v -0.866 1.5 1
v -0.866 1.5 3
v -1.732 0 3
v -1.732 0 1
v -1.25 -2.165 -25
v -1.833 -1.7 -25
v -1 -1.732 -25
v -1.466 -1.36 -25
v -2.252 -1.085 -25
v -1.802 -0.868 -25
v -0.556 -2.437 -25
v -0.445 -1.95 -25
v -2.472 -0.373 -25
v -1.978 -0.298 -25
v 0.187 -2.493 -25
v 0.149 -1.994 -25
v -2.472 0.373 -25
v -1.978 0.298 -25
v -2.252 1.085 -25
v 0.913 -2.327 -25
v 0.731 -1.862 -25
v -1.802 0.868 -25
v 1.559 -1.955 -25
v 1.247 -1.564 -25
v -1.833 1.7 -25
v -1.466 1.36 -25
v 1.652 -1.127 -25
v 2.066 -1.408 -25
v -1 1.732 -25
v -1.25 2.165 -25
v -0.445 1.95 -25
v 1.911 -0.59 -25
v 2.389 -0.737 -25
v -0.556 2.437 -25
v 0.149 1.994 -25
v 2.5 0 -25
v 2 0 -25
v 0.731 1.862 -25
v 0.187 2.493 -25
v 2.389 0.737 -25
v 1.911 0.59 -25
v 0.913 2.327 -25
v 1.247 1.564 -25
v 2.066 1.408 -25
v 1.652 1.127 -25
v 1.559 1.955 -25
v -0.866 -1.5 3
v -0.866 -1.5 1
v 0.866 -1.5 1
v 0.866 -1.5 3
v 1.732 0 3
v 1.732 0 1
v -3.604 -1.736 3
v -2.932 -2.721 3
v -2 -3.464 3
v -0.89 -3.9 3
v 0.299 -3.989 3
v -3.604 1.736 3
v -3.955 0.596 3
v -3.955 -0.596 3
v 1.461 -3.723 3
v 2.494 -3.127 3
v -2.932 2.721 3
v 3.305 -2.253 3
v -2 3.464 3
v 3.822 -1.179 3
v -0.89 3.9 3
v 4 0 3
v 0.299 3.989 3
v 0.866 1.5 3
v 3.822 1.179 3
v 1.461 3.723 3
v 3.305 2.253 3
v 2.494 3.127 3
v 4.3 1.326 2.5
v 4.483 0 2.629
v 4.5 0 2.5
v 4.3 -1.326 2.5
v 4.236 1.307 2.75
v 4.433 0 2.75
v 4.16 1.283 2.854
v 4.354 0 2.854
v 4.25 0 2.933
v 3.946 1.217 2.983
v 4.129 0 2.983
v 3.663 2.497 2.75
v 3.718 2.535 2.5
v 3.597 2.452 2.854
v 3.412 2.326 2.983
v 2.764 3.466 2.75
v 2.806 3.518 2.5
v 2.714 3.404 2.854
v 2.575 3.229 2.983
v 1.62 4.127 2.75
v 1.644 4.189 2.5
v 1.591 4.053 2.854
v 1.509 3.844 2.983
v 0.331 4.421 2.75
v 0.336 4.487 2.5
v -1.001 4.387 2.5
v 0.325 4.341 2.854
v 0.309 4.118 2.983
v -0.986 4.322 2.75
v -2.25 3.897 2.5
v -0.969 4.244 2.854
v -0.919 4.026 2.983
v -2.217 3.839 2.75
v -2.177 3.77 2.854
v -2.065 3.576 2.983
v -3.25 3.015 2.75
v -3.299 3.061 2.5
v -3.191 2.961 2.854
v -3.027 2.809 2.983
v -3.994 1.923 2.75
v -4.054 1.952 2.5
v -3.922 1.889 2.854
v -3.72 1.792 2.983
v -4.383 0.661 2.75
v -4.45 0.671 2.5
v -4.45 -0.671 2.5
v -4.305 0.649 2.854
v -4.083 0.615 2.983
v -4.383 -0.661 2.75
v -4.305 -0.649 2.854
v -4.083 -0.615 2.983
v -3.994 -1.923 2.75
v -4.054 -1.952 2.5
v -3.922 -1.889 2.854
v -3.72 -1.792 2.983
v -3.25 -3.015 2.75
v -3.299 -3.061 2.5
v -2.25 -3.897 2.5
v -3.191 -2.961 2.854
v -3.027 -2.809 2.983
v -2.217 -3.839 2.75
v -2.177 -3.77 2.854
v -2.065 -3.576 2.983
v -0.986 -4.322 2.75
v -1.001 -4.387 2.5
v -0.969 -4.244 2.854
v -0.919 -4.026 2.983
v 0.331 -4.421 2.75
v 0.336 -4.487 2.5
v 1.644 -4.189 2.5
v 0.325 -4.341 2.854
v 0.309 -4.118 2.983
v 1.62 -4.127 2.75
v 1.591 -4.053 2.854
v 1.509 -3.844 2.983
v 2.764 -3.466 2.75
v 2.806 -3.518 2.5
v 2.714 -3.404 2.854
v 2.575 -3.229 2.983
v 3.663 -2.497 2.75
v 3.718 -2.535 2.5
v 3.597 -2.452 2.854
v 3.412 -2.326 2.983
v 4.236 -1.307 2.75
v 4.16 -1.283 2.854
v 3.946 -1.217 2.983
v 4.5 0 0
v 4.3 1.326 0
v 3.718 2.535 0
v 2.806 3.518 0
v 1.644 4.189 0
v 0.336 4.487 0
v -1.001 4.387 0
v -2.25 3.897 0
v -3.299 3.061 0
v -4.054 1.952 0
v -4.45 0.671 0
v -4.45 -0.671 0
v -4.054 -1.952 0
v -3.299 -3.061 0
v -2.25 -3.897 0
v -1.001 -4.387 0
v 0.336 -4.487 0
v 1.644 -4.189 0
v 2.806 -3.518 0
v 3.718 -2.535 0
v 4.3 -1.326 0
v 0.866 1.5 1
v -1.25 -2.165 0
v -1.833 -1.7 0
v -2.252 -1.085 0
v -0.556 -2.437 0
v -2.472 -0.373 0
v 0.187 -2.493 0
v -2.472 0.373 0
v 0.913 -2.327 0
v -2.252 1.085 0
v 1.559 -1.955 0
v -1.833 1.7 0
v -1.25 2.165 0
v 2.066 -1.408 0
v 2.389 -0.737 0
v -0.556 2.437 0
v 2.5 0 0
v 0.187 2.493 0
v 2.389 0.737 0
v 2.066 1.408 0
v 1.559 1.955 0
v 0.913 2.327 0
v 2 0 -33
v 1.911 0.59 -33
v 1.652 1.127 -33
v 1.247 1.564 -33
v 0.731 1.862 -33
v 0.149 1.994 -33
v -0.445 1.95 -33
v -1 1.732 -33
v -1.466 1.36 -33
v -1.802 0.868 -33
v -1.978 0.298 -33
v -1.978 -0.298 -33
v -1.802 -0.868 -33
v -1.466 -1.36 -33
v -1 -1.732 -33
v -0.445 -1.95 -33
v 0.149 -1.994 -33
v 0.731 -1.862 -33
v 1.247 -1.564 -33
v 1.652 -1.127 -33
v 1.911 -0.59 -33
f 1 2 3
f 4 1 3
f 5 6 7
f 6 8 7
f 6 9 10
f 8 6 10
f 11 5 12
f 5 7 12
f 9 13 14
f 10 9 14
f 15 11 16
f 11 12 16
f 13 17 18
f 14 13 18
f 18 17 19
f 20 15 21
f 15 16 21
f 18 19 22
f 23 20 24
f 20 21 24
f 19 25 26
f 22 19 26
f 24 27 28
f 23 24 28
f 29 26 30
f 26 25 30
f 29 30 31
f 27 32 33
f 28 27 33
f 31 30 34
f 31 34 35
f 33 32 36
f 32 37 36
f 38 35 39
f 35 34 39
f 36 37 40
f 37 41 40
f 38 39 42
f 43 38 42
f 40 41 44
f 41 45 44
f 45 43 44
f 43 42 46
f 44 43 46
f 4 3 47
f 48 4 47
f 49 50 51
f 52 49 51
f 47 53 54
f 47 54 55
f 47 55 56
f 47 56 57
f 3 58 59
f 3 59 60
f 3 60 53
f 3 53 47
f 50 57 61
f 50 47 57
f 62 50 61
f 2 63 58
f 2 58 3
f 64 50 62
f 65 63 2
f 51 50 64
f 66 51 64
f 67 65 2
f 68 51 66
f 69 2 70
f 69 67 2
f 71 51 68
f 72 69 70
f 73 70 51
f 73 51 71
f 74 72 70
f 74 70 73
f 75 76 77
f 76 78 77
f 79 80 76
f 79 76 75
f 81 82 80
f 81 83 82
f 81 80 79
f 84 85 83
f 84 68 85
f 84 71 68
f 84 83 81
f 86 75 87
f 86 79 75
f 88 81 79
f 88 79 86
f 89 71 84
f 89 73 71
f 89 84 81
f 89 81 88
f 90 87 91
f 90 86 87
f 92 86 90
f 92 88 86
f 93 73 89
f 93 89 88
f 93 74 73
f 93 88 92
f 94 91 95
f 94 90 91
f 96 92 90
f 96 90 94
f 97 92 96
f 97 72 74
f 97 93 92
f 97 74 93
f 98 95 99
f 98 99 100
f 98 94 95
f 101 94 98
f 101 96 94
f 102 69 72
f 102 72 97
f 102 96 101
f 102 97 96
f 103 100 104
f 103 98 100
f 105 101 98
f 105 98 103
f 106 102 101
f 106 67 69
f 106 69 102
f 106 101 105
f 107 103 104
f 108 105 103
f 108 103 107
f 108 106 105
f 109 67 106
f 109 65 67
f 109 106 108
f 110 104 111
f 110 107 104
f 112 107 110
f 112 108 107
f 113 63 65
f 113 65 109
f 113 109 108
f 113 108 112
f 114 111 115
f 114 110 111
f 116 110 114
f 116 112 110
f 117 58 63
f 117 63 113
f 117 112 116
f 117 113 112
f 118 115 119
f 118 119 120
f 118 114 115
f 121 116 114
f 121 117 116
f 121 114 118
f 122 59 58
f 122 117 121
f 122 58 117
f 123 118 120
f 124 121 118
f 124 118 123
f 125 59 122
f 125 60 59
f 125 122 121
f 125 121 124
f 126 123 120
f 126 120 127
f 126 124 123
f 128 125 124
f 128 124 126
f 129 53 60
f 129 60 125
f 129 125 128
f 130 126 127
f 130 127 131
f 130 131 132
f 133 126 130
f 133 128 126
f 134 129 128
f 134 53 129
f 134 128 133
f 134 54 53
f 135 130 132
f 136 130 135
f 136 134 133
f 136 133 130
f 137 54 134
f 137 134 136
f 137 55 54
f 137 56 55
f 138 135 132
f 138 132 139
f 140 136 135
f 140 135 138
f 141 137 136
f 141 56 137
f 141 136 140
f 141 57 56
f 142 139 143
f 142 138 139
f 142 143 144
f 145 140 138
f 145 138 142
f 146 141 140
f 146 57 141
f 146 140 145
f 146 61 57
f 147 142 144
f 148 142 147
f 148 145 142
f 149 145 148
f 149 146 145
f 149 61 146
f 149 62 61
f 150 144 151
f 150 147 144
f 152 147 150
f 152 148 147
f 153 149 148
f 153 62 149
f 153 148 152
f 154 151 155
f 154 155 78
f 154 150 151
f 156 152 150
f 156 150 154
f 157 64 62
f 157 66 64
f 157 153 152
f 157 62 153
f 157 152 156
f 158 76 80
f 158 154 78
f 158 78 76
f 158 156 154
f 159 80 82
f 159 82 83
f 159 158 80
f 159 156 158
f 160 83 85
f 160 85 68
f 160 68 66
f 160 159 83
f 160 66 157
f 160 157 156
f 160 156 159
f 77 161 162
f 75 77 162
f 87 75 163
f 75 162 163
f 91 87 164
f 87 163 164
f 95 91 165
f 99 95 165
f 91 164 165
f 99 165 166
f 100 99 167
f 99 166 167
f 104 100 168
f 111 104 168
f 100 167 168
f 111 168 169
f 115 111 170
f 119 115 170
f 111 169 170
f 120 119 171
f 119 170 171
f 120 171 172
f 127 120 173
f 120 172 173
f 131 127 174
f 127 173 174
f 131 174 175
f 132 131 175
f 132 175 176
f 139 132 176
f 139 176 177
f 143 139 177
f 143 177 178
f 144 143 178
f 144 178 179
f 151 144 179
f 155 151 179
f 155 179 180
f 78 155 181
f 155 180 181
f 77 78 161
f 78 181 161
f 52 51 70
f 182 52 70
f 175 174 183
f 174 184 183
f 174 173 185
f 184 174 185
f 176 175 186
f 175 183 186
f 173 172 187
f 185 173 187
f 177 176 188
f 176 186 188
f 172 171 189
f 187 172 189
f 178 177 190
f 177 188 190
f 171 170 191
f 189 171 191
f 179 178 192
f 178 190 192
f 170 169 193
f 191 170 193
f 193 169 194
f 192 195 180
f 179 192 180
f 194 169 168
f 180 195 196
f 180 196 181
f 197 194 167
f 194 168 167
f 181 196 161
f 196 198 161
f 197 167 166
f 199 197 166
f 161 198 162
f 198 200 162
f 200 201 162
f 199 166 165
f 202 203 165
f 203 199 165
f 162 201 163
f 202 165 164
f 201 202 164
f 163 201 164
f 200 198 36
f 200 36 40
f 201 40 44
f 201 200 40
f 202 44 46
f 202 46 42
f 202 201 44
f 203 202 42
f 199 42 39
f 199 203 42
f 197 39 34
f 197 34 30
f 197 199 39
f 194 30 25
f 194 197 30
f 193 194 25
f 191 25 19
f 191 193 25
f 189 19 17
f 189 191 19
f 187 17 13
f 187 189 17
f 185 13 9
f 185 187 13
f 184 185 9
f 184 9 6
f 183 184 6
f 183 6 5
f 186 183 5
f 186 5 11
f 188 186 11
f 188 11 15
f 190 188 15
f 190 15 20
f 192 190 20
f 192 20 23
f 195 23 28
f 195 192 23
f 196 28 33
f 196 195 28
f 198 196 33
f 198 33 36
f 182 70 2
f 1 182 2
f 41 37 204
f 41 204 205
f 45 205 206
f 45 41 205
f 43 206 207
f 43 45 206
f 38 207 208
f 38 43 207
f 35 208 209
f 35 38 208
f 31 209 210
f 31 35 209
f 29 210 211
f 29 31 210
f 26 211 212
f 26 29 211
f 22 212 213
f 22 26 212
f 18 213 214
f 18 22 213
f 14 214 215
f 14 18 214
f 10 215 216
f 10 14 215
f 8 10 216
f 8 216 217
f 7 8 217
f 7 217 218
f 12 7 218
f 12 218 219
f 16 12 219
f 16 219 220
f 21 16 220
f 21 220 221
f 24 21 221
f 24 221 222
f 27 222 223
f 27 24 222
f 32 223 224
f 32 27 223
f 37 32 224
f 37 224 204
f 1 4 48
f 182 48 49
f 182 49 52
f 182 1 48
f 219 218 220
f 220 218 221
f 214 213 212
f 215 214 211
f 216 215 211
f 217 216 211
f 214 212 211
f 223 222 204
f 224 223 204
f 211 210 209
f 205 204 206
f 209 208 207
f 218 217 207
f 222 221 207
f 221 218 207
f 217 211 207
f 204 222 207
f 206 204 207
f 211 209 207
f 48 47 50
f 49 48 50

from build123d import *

# Parameters (mm, degrees)
SKETCH_1_R          = 4.5
EXTRUDE_1_DEPTH     = 3
SKETCH_2_R          = 2.5
EXTRUDE_2_DEPTH     = 25
EXTRUDE_START       = -25
SKETCH_3_R          = 2
EXTRUDE_3_DEPTH     = 8
CUT_EXTRUDE_START   = 3
CUT_EXTRUDE_1_DEPTH = 2
FILLET_1_R          = 0.5


with BuildPart() as part:
    # 草图1 → 凸台-拉伸1 (new body)
    with BuildSketch(Plane.XY):
        Circle(SKETCH_1_R)
    extrude(amount=EXTRUDE_1_DEPTH)

    # 草图2 → 凸台-拉伸2 (add)
    with BuildSketch(Plane.XY):
        Circle(SKETCH_2_R)
    extrude(amount=-EXTRUDE_2_DEPTH)

    # 草图3 → 凸台-拉伸3 (add)
    with BuildSketch(Plane.XY.offset(EXTRUDE_START)):
        Circle(SKETCH_3_R)
    extrude(amount=-EXTRUDE_3_DEPTH)

    # 草图4 → 切除-拉伸1 (cut)
    with BuildSketch(Plane.XY.offset(CUT_EXTRUDE_START)):
        Polygon((1.732050808, 0), (0.866025404, 1.5), (-0.866025404, 1.5), (-1.732050808, 0), (-0.866025404, -1.5), (0.866025404, -1.5), align=None)
    extrude(amount=-CUT_EXTRUDE_1_DEPTH, mode=Mode.SUBTRACT)

    # 圆角1
    fillet_1_edges = [part.edges().sort_by_distance(p)[0] for p in [
        (-4.5, 0, 3),
    ]]
    fillet(fillet_1_edges, radius=FILLET_1_R)


solid = part.part
